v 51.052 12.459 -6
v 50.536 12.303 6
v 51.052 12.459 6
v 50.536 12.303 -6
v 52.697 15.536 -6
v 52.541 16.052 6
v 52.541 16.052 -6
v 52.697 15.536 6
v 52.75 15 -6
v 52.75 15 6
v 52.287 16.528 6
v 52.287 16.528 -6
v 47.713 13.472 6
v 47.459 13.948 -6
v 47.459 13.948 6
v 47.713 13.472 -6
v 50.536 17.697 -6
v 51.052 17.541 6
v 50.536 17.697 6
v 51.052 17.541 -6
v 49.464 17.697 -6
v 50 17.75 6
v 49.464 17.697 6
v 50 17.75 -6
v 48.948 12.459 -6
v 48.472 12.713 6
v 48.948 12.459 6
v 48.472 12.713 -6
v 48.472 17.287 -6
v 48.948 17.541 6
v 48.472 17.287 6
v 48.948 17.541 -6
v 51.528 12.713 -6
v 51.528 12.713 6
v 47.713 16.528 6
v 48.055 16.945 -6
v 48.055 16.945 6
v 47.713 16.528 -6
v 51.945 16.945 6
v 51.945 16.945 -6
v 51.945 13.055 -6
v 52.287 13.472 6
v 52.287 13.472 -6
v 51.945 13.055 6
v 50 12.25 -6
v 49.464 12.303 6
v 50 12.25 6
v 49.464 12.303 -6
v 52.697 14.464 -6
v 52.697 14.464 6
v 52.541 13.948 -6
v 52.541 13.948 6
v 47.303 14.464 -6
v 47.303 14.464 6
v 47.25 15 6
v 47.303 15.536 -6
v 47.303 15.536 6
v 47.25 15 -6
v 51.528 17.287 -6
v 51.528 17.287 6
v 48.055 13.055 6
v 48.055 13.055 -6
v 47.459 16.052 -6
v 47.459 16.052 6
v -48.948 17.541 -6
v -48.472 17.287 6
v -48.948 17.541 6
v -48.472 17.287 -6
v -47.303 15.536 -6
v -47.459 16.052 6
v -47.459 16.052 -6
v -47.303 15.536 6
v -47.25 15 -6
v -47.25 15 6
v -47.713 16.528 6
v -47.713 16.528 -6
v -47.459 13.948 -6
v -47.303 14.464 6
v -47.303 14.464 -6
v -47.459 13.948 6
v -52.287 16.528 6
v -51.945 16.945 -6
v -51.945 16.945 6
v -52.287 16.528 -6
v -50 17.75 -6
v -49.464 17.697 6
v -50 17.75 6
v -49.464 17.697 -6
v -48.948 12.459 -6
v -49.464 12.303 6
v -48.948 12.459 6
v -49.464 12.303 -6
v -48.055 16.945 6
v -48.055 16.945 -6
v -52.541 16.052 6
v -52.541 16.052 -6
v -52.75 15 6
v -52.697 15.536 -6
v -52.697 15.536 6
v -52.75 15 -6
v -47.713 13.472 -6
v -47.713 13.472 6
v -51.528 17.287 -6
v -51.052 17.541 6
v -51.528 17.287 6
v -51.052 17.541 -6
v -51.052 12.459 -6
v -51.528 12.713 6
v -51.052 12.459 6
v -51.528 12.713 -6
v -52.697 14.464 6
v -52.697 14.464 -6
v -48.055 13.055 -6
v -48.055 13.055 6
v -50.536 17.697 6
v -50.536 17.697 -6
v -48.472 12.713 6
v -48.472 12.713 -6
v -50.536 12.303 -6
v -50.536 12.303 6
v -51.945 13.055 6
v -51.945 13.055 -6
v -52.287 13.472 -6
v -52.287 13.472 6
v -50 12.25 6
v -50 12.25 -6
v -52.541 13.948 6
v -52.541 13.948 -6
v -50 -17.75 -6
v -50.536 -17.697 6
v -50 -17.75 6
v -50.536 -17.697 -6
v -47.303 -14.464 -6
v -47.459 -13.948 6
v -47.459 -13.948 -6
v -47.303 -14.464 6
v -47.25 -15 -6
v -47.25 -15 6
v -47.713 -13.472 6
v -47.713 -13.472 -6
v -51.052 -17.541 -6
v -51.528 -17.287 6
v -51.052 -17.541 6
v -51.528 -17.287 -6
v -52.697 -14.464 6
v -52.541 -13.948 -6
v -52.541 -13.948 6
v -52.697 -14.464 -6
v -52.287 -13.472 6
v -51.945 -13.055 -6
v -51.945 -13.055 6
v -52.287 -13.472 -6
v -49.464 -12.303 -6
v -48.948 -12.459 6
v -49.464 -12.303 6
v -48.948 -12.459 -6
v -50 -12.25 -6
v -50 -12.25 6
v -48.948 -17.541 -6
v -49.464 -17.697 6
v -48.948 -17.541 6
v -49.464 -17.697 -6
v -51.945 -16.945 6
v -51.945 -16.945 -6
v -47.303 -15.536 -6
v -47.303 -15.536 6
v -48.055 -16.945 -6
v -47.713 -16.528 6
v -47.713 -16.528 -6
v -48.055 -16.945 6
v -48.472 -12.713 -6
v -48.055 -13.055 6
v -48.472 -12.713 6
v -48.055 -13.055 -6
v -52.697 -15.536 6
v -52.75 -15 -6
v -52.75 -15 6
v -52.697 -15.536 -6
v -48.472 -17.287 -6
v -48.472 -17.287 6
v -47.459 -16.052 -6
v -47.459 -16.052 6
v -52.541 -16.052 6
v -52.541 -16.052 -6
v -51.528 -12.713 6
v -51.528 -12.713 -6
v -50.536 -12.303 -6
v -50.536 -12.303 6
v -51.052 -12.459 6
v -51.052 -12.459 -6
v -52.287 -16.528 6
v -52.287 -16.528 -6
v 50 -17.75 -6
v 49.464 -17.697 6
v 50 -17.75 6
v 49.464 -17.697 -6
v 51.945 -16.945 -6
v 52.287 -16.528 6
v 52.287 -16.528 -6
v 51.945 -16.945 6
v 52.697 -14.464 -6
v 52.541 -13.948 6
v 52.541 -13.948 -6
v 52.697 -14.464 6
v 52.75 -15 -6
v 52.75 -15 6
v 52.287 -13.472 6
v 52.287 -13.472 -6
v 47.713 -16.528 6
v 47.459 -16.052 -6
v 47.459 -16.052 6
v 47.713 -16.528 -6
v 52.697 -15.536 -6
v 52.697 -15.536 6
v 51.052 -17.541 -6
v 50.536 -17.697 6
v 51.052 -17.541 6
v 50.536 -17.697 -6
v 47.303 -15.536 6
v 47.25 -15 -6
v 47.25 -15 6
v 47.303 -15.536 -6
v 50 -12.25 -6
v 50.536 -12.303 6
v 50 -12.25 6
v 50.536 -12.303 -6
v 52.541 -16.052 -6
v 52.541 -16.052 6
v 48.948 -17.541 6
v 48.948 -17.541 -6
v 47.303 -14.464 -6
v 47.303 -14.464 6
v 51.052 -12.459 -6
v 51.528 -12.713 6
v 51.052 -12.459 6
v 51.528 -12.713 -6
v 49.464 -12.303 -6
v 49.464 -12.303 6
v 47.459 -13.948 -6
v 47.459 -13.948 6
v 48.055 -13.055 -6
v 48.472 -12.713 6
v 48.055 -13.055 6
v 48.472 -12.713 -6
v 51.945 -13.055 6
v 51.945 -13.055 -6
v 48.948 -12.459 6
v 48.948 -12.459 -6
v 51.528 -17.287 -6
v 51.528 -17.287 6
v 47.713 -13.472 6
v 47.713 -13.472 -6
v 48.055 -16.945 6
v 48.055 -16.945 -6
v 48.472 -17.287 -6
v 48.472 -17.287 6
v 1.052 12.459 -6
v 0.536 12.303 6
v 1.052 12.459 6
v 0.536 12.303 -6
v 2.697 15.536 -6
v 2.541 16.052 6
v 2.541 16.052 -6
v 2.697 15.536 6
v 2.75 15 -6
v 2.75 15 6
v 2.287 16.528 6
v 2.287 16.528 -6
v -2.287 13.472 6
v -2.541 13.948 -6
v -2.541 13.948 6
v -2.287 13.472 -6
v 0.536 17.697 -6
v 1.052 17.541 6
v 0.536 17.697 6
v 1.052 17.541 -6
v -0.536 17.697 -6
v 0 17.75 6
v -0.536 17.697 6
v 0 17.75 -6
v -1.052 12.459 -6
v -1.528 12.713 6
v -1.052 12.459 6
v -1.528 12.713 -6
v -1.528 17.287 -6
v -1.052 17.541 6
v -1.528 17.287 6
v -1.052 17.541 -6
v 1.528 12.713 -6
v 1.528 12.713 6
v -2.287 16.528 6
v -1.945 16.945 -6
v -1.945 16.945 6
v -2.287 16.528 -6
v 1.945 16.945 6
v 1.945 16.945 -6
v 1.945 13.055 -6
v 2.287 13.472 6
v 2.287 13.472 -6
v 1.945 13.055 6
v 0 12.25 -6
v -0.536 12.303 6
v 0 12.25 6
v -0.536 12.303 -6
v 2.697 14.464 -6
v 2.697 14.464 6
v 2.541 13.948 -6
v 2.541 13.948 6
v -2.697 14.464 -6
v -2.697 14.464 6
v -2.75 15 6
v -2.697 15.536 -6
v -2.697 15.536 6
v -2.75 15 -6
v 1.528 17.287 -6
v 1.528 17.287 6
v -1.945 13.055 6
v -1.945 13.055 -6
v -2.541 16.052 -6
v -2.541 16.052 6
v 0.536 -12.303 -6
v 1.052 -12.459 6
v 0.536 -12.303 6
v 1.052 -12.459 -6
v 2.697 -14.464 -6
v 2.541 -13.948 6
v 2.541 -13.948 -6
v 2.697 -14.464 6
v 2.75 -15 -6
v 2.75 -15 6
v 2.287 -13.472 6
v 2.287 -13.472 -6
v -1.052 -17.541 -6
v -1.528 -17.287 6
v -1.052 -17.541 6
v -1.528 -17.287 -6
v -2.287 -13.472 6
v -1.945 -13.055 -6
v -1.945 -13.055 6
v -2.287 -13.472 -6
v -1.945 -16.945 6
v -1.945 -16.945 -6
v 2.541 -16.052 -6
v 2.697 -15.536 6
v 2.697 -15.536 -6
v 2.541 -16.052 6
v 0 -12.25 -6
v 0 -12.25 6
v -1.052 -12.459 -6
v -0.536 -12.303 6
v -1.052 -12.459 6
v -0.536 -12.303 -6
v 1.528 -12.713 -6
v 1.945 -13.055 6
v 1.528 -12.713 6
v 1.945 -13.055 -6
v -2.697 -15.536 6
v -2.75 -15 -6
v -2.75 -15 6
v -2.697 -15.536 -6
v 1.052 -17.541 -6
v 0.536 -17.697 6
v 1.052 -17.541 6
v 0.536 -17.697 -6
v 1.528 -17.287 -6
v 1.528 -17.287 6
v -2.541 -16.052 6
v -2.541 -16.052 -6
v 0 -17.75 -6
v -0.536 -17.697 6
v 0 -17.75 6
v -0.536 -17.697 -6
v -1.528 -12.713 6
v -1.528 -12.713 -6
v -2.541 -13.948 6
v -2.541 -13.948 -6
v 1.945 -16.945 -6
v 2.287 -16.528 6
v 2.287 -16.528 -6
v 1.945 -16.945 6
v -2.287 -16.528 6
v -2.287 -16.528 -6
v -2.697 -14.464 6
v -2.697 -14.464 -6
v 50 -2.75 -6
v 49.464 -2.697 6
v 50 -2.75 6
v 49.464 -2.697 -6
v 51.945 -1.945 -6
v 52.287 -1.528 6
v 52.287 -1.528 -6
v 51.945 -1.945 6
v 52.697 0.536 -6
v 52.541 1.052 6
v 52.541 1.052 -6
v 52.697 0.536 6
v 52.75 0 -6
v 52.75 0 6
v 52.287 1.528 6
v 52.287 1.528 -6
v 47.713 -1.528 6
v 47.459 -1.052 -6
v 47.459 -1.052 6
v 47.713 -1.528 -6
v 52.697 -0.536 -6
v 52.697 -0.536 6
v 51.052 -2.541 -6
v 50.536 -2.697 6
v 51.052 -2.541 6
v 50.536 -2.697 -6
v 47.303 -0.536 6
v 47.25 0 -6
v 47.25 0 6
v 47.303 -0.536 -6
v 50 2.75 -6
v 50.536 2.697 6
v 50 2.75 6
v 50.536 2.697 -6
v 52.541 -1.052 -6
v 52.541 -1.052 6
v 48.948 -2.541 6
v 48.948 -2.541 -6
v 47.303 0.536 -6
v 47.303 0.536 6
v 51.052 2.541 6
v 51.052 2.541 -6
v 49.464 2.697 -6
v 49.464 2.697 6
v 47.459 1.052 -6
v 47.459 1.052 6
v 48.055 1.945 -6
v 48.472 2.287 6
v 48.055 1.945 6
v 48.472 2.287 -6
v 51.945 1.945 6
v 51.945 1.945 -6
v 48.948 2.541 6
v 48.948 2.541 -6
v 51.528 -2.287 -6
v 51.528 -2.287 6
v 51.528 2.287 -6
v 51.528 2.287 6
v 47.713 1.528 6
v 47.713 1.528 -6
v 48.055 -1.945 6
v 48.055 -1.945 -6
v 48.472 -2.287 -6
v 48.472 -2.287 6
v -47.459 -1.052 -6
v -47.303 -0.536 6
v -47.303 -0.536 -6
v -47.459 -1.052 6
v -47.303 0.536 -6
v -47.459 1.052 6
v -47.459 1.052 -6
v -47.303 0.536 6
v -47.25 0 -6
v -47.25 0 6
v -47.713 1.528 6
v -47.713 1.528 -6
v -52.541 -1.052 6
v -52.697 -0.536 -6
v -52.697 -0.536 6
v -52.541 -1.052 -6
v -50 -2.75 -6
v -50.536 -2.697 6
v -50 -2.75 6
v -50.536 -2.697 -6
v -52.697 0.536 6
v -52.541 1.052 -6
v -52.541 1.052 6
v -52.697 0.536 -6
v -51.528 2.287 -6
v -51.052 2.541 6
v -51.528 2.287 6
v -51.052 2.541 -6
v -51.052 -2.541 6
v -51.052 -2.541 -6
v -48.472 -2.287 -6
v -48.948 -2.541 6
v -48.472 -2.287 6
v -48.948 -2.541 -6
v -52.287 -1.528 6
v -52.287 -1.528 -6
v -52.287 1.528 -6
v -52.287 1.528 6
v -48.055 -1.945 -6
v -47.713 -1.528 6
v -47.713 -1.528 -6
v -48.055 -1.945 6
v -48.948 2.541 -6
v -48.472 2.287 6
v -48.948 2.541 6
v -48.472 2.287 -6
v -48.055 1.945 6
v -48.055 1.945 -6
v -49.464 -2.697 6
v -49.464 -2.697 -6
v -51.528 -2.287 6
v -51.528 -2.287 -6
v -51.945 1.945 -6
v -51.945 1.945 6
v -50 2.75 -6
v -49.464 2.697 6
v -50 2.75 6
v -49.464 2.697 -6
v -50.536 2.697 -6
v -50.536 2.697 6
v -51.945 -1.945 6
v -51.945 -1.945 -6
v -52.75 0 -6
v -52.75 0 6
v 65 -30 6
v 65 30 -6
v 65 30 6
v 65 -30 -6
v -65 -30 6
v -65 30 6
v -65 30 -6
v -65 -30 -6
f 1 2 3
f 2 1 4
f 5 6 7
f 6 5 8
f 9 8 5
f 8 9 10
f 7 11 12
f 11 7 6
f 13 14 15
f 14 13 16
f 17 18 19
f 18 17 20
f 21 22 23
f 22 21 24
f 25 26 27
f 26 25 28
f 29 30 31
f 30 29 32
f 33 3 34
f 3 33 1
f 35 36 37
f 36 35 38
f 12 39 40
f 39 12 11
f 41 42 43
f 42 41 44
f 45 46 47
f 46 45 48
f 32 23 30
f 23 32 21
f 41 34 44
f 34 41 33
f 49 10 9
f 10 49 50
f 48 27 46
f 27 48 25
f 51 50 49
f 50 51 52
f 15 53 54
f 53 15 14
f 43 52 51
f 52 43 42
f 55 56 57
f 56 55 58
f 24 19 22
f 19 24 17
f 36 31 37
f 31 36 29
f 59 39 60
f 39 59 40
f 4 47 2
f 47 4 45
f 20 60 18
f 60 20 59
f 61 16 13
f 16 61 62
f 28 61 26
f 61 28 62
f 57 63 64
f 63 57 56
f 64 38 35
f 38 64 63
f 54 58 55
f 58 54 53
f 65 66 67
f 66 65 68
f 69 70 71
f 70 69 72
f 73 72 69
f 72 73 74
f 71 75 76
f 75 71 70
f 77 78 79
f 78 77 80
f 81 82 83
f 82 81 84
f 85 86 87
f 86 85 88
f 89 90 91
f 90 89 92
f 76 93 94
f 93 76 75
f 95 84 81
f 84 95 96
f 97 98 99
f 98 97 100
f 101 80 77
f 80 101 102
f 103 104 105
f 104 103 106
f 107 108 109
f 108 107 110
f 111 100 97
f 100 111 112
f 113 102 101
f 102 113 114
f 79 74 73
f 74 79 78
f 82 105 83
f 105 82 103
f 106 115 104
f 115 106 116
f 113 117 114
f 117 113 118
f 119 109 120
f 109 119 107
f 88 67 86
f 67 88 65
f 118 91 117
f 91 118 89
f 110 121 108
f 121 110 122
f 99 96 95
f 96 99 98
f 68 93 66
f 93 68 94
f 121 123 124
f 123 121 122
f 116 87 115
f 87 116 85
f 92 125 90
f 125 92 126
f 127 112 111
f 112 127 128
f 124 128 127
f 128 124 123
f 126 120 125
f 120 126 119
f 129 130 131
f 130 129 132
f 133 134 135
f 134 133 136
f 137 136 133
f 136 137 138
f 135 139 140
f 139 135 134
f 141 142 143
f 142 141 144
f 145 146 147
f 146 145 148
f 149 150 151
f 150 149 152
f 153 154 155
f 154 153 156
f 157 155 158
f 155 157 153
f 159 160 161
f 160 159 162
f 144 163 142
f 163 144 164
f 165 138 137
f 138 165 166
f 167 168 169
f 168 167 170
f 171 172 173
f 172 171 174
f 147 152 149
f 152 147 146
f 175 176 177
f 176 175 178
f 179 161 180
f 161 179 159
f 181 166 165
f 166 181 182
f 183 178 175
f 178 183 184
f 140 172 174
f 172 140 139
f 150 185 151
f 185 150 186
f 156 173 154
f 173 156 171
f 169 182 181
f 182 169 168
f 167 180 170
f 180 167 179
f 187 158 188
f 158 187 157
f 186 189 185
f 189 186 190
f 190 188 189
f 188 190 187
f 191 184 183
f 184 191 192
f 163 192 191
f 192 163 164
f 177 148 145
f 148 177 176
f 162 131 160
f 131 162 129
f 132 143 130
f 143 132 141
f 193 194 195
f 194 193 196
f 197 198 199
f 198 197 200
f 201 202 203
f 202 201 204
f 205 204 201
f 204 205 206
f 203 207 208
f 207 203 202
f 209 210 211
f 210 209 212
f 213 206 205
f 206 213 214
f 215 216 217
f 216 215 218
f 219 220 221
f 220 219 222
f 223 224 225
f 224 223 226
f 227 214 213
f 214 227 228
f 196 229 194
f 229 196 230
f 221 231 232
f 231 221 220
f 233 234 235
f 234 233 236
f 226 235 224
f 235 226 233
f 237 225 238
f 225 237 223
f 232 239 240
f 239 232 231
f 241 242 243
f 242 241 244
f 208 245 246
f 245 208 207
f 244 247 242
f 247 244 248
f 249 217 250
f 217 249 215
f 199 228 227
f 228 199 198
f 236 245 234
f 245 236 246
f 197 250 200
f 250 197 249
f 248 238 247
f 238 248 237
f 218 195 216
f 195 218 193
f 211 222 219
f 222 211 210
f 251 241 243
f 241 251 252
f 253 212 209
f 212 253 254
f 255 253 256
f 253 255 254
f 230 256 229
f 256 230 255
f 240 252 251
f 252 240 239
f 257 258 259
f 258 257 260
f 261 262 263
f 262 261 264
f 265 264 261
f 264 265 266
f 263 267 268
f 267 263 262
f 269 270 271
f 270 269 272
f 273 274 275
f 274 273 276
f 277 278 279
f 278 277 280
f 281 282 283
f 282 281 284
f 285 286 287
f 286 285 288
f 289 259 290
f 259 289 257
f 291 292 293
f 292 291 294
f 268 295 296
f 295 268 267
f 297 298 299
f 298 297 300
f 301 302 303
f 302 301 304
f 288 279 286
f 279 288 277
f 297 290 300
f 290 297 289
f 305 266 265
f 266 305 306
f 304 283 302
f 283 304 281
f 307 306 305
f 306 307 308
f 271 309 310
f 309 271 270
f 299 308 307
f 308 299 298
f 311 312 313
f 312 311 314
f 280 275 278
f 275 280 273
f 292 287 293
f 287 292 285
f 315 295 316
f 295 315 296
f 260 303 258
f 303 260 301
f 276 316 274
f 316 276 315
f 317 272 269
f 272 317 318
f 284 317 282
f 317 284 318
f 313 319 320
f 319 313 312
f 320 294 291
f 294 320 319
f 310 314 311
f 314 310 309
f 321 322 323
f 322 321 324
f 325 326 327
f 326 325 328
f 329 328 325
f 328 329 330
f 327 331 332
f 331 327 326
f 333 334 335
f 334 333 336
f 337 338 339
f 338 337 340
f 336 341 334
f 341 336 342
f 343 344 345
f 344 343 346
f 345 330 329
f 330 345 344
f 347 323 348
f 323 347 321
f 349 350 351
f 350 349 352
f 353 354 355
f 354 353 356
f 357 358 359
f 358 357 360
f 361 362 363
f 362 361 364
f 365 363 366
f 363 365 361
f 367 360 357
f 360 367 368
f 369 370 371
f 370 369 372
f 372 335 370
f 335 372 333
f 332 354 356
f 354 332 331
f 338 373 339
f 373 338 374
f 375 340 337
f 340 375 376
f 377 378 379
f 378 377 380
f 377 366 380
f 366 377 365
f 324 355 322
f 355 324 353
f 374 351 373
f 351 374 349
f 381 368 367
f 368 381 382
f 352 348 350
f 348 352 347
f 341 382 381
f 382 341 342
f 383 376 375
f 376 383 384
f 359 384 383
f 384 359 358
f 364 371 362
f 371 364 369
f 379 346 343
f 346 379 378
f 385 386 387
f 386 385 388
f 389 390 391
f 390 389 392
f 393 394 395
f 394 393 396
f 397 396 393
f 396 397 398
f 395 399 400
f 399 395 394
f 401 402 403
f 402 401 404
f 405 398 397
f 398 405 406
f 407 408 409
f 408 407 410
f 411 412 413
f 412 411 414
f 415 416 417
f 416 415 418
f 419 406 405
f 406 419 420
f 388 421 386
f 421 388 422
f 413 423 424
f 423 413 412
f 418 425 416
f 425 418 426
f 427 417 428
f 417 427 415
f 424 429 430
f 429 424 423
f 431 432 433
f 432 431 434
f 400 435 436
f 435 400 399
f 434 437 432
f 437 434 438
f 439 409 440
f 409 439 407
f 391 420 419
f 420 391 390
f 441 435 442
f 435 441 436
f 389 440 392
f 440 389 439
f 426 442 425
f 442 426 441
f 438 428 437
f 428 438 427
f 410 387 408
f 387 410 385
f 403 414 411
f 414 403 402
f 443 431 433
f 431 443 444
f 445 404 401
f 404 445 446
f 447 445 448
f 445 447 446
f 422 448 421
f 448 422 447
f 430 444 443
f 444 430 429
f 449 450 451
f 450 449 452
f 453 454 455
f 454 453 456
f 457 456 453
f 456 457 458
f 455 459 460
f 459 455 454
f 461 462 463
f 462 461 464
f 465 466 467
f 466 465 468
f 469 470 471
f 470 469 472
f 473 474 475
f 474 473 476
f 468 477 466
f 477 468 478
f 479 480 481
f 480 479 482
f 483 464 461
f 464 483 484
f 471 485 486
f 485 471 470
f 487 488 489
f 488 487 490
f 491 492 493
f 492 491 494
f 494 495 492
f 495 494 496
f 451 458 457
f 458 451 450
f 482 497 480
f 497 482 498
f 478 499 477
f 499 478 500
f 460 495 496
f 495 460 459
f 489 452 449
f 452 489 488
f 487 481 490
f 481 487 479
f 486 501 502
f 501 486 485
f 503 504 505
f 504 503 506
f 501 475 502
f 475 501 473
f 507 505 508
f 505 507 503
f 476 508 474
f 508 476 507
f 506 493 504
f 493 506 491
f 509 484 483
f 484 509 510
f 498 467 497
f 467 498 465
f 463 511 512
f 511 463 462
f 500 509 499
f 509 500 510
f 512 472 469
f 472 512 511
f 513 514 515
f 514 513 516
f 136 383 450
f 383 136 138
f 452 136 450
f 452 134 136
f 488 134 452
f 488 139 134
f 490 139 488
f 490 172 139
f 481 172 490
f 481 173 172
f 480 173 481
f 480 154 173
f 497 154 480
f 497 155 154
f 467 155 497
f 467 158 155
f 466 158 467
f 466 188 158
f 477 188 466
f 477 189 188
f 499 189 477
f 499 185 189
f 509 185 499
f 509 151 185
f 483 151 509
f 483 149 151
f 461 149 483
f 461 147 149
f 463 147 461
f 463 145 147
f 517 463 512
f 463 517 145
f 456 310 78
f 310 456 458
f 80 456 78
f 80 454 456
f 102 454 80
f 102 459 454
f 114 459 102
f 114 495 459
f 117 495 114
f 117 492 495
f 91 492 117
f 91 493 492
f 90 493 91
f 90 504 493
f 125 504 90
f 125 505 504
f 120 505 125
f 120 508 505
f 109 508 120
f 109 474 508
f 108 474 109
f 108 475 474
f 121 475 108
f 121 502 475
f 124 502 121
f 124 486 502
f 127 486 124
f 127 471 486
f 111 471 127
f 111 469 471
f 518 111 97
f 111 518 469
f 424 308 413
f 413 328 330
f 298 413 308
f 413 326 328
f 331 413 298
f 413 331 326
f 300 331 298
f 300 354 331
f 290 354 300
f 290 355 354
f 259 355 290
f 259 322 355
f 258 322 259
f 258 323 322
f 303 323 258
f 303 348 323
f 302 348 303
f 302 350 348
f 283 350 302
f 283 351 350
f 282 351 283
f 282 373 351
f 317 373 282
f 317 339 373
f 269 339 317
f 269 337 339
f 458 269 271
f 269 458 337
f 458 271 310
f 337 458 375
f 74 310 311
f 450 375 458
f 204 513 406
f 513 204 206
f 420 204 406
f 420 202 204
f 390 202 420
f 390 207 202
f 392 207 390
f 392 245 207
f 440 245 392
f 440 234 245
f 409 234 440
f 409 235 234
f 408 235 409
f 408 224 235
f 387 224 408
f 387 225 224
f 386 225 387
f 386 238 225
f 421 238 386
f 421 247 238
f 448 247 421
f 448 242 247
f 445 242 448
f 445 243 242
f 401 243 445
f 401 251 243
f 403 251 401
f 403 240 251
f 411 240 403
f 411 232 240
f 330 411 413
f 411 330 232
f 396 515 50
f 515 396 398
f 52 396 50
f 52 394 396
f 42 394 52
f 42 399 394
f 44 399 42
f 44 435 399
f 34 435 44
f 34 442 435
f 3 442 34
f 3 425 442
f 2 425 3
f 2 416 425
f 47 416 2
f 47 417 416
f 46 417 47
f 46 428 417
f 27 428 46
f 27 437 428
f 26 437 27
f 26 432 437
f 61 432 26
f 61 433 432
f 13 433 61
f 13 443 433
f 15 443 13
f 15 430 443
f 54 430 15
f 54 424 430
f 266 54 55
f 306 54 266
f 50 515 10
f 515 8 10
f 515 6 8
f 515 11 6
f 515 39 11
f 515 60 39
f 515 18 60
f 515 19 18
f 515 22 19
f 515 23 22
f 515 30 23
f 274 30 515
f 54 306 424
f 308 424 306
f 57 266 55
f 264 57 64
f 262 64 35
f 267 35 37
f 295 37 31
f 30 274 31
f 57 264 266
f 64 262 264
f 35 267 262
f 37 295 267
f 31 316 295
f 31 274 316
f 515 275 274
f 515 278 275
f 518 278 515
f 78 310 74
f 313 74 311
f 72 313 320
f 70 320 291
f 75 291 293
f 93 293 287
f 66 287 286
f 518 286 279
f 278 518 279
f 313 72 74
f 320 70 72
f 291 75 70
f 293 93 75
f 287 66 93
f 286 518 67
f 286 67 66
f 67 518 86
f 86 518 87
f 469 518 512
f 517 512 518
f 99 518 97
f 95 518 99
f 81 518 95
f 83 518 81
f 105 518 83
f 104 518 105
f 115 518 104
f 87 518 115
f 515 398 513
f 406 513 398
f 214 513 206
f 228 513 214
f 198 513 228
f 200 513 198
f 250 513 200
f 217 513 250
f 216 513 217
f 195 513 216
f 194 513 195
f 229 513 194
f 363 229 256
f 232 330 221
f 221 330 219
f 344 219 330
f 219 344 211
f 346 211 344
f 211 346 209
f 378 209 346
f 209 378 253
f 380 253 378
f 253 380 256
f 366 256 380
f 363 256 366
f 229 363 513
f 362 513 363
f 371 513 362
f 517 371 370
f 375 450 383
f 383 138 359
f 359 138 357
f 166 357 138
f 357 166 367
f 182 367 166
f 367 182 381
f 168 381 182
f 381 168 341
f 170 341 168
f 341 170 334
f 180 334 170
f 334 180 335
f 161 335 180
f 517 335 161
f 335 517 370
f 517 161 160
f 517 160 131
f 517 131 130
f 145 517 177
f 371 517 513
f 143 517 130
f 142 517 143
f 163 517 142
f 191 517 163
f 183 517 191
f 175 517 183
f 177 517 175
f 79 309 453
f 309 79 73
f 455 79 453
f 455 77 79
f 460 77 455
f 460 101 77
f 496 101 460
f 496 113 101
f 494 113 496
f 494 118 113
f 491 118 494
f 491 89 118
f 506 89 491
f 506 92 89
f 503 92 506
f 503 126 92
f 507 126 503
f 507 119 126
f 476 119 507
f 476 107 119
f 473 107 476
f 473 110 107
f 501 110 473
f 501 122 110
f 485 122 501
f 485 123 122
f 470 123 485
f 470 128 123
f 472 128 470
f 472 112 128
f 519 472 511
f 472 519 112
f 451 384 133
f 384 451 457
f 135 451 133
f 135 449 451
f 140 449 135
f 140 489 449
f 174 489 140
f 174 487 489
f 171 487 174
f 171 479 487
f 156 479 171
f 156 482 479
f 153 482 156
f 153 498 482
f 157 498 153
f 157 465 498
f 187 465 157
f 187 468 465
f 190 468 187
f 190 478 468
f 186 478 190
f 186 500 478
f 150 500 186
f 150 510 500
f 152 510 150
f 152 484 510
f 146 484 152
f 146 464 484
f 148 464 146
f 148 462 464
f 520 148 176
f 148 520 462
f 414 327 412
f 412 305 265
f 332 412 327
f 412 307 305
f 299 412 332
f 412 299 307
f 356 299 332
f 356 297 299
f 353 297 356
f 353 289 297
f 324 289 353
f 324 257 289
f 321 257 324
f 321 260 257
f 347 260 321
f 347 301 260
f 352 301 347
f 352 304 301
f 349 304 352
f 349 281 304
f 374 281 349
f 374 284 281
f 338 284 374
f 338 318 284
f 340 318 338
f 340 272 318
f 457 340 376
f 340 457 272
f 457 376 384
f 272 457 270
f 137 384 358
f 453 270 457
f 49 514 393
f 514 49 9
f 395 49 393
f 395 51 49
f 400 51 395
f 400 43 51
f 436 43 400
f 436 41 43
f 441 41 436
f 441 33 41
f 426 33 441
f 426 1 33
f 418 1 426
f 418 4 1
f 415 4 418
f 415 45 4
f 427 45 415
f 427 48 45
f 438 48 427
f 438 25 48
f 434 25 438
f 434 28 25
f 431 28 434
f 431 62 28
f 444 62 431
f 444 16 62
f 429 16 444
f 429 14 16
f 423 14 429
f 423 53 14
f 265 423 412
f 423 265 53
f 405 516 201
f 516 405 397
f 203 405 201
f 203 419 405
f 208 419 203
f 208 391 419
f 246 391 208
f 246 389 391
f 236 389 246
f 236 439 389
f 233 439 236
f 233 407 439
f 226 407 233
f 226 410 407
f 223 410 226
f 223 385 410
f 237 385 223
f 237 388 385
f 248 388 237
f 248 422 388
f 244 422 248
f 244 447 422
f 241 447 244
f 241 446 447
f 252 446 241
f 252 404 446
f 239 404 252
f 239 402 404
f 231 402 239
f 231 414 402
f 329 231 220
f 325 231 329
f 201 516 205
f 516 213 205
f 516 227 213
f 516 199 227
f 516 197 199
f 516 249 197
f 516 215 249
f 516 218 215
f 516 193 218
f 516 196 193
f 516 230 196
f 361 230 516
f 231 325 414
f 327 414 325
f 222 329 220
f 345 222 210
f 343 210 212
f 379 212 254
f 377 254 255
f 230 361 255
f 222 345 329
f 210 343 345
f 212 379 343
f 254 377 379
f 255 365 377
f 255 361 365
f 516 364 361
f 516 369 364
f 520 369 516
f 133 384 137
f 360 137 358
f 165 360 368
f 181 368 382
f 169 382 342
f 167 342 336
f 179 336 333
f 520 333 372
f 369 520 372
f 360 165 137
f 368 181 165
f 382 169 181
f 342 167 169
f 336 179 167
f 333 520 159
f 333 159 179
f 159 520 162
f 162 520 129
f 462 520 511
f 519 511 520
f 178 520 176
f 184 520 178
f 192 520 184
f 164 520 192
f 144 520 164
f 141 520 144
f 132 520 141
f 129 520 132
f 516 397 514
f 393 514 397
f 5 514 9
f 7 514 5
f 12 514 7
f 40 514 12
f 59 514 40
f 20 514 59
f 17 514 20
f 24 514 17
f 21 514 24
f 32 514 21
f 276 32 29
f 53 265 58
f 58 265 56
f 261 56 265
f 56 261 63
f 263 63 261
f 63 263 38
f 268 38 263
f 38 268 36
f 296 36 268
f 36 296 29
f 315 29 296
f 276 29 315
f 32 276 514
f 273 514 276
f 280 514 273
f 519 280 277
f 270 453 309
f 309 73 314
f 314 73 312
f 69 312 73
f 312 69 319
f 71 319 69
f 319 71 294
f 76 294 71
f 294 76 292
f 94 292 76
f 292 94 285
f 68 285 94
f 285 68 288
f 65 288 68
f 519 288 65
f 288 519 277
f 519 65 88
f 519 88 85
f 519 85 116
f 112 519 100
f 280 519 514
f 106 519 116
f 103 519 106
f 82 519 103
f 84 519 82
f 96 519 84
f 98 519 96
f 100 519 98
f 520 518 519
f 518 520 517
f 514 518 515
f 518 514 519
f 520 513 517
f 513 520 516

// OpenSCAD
$fn = 32;

// ----------------------------------------------------------------------
// Corner plate 130 x 60 x 12
// 8 holes, centres taken from the edge offset
// ----------------------------------------------------------------------

// --- parameters (mm) ---
plate = [130, 60, 12];  // overall size (x, y, z)
holes = 8;              // number of holes the drawing asks for
hole_d = 5.5;           // hole diameter
edge = 15;              // hole centre offset from the plate edge

// --- derived feature positions (mm) ---
corner_x = plate[0] / 2 - edge;  // = 50   corner hole X
corner_y = plate[1] / 2 - edge;  // = 15   corner hole Y
feature_centers = [
  [corner_x, corner_y],
  [-corner_x, corner_y],
  [-corner_x, -corner_y],
  [corner_x, -corner_y],
  [0, corner_y],
  [0, -corner_y],
  [corner_x, 0],
  [-corner_x, 0]
];   // hole centres the loop below drills

// plate outline, every hole drilled through with the same cutters
difference() {
  cube(plate, center = true);
  for (centre = feature_centers)
    translate([centre[0], centre[1], 0])
      cylinder(d = hole_d, h = plate[2] + 2, center = true);
}
